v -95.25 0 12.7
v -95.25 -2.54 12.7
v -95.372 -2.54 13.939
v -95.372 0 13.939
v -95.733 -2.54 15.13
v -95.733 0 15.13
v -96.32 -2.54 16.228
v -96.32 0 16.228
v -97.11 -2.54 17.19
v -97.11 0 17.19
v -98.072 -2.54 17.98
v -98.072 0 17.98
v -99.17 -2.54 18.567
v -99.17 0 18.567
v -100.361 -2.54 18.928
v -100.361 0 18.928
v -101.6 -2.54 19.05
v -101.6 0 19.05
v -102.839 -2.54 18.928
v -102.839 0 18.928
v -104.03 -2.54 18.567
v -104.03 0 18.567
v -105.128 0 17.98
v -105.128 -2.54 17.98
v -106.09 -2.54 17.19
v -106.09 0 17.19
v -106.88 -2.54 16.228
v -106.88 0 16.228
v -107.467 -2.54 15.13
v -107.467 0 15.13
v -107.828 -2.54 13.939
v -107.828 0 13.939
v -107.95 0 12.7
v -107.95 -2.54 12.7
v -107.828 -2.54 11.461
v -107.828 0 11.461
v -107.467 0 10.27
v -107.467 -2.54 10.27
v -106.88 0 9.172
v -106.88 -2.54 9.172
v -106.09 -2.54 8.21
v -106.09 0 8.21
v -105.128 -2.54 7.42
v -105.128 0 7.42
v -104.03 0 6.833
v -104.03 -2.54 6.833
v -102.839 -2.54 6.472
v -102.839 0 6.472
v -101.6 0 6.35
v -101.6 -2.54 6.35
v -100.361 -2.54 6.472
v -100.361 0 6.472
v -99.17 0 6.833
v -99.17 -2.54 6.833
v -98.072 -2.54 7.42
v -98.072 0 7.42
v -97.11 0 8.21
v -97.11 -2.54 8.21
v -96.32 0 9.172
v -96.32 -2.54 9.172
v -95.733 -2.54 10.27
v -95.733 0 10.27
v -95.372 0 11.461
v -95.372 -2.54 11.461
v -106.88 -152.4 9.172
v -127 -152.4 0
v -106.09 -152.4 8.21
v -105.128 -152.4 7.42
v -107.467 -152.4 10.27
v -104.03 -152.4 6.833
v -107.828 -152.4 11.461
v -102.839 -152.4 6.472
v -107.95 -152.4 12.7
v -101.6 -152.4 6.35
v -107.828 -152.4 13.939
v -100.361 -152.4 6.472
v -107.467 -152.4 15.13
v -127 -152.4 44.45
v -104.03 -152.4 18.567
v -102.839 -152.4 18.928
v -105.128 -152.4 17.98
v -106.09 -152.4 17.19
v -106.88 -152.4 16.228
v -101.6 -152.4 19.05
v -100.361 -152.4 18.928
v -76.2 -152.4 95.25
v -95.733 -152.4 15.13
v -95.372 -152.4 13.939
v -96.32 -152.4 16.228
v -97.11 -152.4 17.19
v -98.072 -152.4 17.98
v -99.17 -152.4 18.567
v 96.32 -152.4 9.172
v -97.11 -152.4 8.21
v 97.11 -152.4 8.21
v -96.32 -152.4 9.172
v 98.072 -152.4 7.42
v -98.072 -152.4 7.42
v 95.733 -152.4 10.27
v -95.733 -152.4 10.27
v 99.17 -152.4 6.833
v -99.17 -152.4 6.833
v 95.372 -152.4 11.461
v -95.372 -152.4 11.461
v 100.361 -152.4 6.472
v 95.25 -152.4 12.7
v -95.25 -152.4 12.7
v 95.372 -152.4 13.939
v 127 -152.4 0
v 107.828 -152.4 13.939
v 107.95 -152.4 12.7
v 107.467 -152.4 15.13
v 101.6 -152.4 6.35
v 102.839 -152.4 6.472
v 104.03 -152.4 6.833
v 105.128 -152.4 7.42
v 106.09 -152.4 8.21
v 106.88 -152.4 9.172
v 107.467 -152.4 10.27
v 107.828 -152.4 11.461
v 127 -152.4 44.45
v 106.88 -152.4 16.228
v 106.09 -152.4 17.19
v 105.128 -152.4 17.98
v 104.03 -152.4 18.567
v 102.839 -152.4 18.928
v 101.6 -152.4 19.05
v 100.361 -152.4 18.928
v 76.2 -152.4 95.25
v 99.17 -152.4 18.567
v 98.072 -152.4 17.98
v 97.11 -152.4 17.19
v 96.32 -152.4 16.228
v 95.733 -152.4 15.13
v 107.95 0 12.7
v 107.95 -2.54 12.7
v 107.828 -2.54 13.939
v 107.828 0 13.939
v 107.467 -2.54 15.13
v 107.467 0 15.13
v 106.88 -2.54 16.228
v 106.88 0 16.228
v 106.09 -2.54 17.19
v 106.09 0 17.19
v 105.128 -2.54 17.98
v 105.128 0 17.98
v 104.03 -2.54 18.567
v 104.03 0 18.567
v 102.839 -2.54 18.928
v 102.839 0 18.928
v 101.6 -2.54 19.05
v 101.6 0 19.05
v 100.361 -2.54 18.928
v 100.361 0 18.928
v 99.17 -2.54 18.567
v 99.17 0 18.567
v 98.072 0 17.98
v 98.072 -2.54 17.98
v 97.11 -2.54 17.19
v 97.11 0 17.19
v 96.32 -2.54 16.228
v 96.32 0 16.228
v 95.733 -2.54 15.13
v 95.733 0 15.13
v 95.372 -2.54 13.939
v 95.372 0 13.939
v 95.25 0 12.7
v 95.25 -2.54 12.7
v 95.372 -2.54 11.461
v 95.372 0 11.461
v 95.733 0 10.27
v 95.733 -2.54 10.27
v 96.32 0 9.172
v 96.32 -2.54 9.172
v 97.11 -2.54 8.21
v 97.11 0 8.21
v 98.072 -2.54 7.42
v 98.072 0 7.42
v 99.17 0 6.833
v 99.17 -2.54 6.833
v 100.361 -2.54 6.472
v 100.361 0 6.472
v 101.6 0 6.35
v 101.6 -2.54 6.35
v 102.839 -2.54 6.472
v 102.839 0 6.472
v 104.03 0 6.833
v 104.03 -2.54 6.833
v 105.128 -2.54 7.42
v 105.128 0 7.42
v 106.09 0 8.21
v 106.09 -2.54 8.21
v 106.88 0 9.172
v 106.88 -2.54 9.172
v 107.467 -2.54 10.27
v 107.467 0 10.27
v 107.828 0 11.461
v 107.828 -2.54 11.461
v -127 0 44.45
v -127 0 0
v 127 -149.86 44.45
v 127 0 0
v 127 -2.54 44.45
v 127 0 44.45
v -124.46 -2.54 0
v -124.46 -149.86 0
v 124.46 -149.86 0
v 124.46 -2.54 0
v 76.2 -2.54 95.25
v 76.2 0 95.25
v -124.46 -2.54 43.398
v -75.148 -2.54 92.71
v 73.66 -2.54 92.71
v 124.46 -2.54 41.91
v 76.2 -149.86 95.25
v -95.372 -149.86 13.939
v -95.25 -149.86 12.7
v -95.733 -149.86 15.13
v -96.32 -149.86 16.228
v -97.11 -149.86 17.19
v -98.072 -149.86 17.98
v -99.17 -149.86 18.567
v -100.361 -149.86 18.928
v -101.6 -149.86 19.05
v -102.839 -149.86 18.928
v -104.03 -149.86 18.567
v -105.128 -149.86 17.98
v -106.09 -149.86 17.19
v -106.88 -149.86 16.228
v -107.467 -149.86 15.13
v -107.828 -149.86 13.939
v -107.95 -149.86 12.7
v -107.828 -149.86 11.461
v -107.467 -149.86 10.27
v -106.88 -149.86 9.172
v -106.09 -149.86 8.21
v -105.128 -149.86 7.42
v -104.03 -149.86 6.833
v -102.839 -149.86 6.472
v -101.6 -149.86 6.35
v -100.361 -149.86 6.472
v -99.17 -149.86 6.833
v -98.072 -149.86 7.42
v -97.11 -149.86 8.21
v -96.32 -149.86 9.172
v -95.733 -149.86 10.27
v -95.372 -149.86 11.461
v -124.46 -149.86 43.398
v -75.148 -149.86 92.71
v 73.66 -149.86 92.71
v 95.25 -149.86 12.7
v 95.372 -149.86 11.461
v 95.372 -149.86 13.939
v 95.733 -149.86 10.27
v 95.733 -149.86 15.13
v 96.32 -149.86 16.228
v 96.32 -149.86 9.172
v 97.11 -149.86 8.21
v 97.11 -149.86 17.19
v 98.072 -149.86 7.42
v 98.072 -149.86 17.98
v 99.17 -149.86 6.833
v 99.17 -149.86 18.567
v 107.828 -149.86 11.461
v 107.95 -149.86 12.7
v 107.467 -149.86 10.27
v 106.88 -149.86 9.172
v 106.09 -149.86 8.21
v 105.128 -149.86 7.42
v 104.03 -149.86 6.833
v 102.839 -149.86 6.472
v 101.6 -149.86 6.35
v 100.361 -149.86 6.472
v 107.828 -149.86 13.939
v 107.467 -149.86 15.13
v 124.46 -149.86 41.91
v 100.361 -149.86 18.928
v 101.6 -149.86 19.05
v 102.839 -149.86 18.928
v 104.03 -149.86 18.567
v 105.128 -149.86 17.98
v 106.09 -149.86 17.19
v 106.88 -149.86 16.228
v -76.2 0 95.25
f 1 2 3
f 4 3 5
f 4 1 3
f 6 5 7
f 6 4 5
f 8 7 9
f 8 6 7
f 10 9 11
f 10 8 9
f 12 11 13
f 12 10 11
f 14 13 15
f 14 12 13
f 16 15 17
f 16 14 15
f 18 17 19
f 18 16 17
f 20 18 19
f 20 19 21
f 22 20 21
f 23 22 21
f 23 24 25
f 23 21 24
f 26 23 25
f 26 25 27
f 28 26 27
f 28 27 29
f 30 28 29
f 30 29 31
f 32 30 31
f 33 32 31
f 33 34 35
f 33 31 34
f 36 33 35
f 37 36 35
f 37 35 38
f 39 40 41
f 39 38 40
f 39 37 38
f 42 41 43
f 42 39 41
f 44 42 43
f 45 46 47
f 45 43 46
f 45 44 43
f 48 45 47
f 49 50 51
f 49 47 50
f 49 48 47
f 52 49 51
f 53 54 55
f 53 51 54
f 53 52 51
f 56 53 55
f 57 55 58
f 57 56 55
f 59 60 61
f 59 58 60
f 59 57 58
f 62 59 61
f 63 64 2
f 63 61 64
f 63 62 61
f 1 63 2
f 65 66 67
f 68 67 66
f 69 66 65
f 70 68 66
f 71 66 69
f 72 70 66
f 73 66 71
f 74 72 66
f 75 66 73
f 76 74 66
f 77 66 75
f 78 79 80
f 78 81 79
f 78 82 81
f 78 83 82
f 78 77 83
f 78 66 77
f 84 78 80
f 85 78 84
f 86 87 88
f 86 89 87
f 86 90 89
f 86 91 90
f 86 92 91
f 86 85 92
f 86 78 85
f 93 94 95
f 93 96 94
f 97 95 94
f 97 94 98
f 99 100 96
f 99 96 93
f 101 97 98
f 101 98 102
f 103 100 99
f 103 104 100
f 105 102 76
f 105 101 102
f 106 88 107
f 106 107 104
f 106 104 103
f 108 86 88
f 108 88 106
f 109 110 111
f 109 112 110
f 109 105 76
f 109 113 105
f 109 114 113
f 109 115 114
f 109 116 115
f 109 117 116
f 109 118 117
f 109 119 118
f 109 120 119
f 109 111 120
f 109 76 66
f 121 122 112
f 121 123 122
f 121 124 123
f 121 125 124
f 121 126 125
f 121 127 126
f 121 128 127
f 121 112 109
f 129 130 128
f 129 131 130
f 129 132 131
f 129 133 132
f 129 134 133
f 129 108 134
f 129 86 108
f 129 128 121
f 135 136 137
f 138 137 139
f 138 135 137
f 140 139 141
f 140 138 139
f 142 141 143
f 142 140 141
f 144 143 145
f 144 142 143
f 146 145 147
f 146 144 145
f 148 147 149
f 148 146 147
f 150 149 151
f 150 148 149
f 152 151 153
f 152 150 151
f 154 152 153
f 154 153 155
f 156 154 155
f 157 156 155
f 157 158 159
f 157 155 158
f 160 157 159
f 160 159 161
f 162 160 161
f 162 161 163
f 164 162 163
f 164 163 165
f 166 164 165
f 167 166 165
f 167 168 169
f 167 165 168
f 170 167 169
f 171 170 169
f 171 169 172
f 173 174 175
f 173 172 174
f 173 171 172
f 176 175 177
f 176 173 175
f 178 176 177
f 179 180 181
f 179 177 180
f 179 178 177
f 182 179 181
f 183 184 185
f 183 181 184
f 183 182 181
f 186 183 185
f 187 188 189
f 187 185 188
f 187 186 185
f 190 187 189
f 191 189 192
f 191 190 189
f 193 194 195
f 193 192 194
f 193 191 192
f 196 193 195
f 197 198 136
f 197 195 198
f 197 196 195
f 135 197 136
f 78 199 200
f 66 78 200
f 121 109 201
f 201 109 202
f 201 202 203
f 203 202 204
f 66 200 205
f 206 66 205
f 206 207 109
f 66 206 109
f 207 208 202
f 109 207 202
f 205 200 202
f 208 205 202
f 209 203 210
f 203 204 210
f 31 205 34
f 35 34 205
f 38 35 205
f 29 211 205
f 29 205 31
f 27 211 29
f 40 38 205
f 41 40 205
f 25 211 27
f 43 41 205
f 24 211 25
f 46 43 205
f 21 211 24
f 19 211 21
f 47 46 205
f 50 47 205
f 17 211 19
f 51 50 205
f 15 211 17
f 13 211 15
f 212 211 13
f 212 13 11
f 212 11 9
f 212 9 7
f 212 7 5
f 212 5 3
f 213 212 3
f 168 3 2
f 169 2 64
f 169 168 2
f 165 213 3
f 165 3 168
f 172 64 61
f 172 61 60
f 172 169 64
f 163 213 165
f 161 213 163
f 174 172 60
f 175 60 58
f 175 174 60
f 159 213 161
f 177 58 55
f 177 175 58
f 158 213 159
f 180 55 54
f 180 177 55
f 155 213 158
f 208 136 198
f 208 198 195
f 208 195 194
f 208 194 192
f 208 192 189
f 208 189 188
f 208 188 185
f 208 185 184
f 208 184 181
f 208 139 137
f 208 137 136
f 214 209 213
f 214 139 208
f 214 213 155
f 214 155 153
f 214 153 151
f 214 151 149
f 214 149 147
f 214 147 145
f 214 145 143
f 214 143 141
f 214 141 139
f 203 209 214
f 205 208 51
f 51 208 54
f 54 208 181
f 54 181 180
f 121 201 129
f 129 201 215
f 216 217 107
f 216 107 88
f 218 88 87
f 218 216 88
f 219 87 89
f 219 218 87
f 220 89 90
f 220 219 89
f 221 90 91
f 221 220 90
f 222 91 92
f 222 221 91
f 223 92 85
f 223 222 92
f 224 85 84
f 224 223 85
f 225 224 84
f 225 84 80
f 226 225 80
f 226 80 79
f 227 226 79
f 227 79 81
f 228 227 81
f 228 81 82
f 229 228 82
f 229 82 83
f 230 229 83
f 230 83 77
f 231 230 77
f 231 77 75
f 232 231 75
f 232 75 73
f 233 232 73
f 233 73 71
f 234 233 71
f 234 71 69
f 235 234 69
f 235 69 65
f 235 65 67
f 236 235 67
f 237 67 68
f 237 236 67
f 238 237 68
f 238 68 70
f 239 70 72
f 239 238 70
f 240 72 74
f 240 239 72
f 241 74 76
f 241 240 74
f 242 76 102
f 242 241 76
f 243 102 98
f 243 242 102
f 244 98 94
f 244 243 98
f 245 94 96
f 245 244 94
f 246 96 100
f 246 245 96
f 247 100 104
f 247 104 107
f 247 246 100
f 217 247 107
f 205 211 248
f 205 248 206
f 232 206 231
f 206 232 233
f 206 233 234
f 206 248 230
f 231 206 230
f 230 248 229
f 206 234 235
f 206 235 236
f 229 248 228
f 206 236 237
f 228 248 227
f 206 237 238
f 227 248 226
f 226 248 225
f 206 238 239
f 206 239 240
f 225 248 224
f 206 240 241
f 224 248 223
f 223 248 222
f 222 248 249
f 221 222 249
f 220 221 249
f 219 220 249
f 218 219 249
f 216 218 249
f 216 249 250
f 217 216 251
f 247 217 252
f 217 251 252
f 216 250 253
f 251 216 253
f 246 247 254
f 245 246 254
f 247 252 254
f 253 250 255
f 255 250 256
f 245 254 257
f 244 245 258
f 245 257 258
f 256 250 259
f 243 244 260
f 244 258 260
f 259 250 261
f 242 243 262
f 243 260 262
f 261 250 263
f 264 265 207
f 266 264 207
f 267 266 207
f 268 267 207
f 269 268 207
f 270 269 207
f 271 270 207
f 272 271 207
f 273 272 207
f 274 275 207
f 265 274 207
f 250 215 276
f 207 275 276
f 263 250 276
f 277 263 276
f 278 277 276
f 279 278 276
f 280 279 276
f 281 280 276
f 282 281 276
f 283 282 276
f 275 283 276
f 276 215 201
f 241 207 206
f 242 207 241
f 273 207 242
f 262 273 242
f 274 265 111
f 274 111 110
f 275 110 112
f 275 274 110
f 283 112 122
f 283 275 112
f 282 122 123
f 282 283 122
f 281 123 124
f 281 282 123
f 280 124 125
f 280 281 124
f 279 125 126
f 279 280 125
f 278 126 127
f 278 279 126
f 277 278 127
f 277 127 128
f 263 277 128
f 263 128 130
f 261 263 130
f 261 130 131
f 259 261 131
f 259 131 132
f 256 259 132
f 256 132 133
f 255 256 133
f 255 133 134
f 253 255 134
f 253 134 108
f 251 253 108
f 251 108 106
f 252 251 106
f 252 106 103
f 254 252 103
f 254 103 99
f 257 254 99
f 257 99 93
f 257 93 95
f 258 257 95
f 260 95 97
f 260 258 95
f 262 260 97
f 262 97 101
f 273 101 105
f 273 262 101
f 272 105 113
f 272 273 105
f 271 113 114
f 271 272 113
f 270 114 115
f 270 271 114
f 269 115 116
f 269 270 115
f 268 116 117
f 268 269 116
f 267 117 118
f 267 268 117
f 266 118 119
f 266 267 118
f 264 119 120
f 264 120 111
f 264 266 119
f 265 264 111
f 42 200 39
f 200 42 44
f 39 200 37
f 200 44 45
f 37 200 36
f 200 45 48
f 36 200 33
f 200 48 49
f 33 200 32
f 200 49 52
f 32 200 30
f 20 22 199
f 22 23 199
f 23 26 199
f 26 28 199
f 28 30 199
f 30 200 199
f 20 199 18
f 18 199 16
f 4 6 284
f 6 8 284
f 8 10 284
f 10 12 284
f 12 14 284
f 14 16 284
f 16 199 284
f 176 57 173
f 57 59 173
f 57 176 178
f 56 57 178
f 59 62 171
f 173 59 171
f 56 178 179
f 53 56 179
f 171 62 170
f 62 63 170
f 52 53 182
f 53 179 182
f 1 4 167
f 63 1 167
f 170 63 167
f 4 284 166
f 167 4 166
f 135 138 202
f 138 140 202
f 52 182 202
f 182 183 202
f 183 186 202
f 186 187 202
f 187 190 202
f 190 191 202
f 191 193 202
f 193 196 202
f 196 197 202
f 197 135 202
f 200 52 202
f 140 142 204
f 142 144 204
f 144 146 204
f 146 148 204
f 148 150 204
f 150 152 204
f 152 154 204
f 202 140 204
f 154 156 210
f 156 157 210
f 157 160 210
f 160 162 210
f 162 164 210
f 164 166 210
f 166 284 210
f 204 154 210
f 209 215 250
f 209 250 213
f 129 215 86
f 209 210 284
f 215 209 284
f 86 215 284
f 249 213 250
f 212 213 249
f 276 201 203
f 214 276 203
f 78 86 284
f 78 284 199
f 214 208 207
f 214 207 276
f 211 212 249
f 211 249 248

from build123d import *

# Parameters (mm, degrees)
F0_R     = 6.35
F1_DEPTH = 152.4
F2_T     = -2.54
F3_W     = 248.92
F3_H     = 147.32
F4_DEPTH = 25.4
F5_W     = 71.842049
F5_H     = 147.32
F6_DEPTH = 25.4


with BuildPart() as f1:
    # F0 (on Front) → F1 (new body)
    with BuildSketch(Plane.XZ):
        Polygon((-76.2, 95.25), (-127, 44.45), (-127, 0), (127, 0), (127, 44.45), (76.2, 95.25), align=None)
        with Locations((-101.6, 12.7)):
            Circle(F0_R, mode=Mode.SUBTRACT)
        with Locations((101.6, 12.7)):
            Circle(F0_R, mode=Mode.SUBTRACT)
    extrude(amount=F1_DEPTH)

    # F2
    f2_openings = [f1.faces().sort_by_distance(p)[0] for p in [
        (0, -76.2, 0),
    ]]
    offset(amount=F2_T, openings=f2_openings)

    # F3 (on face) → F4 (cut)
    with BuildSketch(Plane(origin=(0, 0, 0), x_dir=(1, 0, 0), z_dir=(0, 0, -1))):
        with Locations((0, 76.2)):
            Rectangle(F3_W, F3_H)
    extrude(amount=-F4_DEPTH, mode=Mode.SUBTRACT)

    # F5 (on face) → F6 (cut)
    with BuildSketch(Plane(origin=(85.725, 0, 85.725), x_dir=(0.707107, 0, -0.707107), z_dir=(0.707107, 0, 0.707107))):
        with Locations((22.45064, -76.2)):
            Rectangle(F5_W, F5_H)
    extrude(amount=-F6_DEPTH, mode=Mode.SUBTRACT)


solid = f1.part
